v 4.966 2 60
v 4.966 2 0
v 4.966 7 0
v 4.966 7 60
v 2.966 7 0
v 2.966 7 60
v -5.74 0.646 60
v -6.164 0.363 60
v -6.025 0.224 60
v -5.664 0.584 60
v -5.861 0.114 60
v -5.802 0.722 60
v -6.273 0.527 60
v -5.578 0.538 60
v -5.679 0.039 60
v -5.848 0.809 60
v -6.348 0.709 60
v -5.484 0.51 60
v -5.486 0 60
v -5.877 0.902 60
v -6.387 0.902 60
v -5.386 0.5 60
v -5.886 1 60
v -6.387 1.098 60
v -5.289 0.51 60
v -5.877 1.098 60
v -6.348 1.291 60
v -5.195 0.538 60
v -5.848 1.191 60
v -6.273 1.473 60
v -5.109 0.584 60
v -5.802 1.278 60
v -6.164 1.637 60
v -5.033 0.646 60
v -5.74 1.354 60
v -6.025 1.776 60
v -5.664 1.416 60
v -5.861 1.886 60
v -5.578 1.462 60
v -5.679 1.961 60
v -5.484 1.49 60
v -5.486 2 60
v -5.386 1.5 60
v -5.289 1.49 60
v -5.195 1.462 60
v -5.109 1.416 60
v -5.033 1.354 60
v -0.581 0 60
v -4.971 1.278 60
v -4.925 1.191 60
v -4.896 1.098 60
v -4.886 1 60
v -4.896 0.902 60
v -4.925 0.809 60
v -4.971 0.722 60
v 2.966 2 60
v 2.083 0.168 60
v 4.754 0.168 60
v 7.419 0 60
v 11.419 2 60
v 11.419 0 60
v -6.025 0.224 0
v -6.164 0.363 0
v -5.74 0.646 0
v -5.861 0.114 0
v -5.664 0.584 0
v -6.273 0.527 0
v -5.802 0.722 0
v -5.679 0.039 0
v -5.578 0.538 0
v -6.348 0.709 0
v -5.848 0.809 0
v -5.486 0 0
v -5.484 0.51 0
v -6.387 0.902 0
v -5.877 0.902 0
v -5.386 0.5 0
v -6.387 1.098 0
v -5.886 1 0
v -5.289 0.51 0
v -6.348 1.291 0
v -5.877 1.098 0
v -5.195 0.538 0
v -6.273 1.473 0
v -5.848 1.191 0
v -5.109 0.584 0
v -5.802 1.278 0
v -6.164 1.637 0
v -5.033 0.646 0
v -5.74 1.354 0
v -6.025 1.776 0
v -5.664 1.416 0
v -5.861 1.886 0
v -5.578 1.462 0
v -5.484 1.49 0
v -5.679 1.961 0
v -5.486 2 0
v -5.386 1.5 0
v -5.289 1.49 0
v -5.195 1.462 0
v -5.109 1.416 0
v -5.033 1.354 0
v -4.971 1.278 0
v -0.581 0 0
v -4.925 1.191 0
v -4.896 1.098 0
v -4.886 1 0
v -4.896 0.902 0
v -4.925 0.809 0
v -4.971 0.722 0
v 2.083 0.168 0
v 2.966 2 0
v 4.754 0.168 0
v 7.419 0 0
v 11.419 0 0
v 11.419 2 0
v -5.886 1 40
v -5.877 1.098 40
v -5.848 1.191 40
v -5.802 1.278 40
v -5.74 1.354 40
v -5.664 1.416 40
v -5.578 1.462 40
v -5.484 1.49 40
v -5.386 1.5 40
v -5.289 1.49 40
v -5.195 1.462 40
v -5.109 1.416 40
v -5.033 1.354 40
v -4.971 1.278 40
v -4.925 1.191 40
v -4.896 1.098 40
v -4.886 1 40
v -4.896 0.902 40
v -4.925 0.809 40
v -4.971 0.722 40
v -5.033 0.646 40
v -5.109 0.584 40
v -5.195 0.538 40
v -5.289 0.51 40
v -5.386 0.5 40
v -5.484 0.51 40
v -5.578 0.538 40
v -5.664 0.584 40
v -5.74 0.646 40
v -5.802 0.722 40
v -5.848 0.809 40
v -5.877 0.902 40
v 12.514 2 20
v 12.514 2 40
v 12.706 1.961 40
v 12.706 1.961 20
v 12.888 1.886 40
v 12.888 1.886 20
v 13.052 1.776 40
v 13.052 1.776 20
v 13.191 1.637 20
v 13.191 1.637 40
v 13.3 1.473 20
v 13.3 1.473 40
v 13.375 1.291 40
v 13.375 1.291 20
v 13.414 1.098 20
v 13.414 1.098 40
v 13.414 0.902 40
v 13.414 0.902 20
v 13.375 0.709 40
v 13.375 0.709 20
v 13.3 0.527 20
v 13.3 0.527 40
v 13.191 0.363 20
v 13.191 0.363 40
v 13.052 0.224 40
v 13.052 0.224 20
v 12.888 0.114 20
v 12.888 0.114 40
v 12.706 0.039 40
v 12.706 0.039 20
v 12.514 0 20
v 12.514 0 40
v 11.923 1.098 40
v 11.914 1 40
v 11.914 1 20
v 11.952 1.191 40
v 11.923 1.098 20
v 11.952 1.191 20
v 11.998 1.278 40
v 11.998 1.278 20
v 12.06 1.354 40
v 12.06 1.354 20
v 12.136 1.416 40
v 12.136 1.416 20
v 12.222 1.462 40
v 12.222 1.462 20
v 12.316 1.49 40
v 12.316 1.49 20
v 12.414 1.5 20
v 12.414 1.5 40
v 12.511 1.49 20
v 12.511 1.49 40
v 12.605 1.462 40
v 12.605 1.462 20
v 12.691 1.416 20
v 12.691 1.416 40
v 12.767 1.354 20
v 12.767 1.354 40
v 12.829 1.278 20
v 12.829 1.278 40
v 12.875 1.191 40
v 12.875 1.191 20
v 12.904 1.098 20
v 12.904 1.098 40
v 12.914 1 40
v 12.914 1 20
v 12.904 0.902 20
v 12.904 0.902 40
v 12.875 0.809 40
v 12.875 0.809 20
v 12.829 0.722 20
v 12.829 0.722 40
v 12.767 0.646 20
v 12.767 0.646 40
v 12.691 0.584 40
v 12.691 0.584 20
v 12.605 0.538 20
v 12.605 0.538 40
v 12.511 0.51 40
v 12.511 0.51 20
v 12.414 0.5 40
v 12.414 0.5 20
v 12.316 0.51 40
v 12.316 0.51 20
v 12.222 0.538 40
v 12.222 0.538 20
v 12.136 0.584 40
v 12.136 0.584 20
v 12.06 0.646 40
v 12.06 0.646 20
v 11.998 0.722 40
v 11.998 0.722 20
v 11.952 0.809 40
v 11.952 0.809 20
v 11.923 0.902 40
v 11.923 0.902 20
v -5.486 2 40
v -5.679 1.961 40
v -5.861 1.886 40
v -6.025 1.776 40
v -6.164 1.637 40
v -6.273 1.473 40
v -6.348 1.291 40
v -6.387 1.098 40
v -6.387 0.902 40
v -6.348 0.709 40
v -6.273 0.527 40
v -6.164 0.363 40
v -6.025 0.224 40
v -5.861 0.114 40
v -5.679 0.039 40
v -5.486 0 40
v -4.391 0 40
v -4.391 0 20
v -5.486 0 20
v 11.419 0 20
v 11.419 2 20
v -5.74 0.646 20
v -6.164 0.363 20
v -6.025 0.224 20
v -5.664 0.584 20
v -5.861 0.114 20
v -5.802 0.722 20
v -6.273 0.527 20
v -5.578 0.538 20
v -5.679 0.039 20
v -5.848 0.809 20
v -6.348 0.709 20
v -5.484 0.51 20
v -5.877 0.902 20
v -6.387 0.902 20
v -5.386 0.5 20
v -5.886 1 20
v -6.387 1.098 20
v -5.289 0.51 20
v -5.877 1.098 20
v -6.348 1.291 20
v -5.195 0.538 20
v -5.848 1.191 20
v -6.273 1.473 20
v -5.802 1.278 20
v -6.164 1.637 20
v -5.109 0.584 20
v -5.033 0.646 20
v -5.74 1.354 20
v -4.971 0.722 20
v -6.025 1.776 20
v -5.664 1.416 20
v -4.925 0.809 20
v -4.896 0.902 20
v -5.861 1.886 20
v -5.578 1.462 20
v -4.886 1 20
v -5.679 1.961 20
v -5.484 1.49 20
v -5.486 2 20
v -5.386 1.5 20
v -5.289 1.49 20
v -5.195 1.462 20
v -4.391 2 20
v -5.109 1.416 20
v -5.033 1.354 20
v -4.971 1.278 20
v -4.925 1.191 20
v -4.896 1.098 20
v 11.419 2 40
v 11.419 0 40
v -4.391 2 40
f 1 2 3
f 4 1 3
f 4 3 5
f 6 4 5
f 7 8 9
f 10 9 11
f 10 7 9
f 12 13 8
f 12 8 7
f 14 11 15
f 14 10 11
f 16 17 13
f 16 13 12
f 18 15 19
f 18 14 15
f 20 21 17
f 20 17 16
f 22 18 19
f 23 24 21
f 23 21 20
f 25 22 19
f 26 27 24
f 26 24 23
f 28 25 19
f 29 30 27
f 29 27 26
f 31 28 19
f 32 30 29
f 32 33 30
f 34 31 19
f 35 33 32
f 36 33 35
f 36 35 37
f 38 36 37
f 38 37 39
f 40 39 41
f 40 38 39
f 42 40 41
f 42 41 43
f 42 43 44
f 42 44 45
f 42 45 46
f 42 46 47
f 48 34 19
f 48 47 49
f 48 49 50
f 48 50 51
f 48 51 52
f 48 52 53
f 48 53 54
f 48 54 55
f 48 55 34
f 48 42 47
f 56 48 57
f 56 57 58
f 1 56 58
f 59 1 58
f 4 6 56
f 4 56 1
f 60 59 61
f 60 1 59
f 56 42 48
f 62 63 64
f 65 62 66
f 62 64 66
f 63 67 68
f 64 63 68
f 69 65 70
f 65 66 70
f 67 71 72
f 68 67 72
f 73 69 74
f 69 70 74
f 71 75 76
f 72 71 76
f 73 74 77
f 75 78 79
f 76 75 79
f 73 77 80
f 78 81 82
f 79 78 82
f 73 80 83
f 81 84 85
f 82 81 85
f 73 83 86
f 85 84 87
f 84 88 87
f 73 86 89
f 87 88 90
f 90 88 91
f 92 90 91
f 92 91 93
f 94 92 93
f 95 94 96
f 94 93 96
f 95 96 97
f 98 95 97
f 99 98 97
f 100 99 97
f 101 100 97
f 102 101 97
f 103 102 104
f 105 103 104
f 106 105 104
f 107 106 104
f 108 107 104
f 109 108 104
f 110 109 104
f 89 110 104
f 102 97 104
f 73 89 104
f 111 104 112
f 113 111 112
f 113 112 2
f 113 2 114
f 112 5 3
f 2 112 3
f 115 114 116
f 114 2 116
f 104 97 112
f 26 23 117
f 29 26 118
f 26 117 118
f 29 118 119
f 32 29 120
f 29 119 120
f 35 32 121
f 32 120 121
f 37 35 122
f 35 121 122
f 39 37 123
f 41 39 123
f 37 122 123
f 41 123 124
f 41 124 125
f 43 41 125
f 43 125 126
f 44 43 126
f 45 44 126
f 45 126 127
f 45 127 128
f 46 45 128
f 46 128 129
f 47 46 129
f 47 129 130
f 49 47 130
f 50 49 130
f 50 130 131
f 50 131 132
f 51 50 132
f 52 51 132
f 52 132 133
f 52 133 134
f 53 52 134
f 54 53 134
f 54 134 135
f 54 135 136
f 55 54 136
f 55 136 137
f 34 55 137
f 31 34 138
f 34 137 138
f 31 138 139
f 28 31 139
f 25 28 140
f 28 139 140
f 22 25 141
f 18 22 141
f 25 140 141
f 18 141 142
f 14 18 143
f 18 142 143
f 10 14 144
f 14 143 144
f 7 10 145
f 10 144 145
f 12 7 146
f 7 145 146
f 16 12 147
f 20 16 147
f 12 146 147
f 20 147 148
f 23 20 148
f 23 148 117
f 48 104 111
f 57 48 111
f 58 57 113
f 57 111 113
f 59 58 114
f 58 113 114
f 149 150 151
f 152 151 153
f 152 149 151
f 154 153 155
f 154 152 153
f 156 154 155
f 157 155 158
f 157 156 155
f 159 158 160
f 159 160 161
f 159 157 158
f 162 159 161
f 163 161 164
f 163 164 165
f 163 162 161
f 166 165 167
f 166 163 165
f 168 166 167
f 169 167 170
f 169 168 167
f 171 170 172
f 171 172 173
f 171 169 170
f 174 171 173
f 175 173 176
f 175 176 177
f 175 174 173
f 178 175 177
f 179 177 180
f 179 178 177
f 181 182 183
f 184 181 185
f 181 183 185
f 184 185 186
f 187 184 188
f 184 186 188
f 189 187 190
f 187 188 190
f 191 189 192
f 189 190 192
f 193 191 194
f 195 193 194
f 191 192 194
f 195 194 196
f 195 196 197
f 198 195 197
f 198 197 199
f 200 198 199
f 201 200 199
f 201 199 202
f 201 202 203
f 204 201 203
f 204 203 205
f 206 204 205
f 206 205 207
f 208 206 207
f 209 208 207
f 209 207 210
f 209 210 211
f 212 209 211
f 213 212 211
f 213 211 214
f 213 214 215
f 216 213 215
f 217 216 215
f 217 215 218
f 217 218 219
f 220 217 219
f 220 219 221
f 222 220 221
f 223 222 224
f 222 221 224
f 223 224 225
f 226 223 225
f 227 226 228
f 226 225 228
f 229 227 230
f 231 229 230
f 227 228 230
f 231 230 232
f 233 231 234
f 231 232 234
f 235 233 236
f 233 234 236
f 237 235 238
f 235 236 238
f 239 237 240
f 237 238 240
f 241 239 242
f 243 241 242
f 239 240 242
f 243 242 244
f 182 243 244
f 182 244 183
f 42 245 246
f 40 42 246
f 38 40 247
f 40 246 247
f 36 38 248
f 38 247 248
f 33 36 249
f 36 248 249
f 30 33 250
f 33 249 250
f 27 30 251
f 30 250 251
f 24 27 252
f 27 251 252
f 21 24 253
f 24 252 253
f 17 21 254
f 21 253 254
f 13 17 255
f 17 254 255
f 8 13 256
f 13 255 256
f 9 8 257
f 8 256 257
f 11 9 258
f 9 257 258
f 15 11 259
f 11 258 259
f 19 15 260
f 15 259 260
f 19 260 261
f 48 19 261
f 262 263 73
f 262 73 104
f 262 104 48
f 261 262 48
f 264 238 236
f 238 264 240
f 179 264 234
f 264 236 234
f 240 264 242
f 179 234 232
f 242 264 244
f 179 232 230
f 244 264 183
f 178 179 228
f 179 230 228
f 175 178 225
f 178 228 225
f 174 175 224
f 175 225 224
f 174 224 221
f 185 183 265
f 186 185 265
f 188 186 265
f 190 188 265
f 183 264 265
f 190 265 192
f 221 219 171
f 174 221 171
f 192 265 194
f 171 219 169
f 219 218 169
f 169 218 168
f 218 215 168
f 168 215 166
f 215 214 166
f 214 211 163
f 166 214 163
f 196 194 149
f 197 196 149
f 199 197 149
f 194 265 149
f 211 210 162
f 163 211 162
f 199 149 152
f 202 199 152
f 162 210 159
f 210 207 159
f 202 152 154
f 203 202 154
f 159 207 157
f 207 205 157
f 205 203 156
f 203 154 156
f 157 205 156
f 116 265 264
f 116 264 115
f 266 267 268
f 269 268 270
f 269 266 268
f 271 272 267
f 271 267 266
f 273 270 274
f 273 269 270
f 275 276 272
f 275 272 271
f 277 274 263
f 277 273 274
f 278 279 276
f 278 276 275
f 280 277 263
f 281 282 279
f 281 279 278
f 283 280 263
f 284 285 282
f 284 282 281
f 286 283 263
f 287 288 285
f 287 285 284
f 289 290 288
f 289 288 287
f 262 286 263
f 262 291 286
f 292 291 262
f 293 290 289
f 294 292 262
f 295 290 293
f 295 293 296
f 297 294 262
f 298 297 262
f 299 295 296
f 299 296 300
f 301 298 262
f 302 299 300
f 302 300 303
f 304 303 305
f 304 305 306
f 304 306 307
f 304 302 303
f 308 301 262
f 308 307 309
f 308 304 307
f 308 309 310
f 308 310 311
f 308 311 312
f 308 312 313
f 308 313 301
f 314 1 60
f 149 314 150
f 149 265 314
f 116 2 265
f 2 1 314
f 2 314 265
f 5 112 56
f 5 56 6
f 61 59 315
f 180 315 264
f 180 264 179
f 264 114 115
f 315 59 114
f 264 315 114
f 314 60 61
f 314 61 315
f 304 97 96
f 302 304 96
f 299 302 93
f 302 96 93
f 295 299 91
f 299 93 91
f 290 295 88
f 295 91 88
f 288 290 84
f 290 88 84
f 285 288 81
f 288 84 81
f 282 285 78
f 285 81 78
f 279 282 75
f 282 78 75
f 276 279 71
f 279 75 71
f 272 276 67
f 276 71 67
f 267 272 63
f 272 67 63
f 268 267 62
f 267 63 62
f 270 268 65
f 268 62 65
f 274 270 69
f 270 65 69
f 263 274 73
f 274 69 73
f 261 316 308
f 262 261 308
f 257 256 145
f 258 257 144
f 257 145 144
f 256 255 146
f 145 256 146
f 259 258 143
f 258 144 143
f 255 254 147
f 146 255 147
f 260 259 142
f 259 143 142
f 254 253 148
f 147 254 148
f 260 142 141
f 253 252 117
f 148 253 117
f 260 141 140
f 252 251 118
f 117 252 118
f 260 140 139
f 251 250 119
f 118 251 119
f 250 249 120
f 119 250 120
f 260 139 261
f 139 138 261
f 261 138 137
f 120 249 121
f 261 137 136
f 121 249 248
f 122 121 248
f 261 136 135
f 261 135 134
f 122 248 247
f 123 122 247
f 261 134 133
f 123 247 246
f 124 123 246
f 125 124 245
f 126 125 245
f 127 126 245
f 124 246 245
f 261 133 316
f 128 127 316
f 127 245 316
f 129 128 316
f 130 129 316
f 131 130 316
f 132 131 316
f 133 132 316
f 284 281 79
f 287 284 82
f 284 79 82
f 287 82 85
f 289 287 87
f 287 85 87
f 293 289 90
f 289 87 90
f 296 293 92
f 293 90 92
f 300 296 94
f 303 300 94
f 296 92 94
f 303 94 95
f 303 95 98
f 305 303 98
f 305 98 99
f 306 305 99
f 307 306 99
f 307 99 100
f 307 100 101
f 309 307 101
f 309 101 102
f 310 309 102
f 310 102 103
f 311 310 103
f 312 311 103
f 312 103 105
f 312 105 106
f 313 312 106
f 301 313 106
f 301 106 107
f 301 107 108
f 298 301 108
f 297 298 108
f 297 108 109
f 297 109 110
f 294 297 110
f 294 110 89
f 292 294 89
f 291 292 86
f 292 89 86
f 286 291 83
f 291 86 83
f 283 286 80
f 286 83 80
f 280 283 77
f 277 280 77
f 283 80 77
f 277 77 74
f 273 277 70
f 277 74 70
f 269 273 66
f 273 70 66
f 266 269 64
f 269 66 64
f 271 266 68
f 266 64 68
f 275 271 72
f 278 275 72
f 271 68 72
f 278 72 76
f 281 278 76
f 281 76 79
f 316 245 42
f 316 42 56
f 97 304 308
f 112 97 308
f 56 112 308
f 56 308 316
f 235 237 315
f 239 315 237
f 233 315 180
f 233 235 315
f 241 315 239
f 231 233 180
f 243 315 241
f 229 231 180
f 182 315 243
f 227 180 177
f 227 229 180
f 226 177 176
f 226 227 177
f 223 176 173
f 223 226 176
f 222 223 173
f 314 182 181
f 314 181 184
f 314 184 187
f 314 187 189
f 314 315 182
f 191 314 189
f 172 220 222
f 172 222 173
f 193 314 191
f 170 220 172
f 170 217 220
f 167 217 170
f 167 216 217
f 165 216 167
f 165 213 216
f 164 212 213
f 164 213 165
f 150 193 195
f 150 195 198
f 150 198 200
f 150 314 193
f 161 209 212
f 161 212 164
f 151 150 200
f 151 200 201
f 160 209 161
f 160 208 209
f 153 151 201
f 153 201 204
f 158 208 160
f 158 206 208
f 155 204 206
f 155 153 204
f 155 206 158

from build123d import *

# Parameters (mm, degrees)
SKETCH1_W           = 20
SKETCH1_H           = 2
BOSS_EXTRUDE1_DEPTH = 60
CUT_EXTRUDE2_DEPTH  = 70
SKETCH5_R           = 0.5
CUT_EXTRUDE3_DEPTH  = 70
SKETCH6_W           = 2
SKETCH6_H           = 20
CUT_EXTRUDE4_DEPTH  = 70
SKETCH7_W           = 2
SKETCH7_H           = 5
BOSS_EXTRUDE2_DEPTH = 60
SKETCH9_W           = 8
SKETCH9_H           = 60
CUT_EXTRUDE5_DEPTH  = 1
BOSS_EXTRUDE3_DEPTH = 60


with BuildPart() as part:
    # Sketch1 → Boss-Extrude1 (new body)
    with BuildSketch(Plane.XY):
        with Locations((3.513513514, 1)):
            Rectangle(SKETCH1_W, SKETCH1_H)
    extrude(amount=BOSS_EXTRUDE1_DEPTH)

    # Sketch4 → Cut-Extrude2 (cut)
    with BuildSketch(Plane(origin=(0, 0, 0), x_dir=(-1, 0, 0), z_dir=(0, 0, -1))):
        with BuildLine():
            Line((-13.513513514, 2), (-12.513513514, 2))
            ThreePointArc((-12.513513514, 2), (-13.417253411, 0.949937849), (-12.413513514, -0.004987562))
            Line((-12.413513514, -0.004987562), (-13.513513514, -0.004987562))
            Line((-13.513513514, -0.004987562), (-13.513513514, 2))
        make_face()
        with BuildLine():
            Line((6.486486486, 2), (5.486486486, 2))
            ThreePointArc((5.486486486, 2), (6.390226384, 0.949937849), (5.386486486, -0.004987562))
            Line((5.386486486, -0.004987562), (6.486486486, -0.004987562))
            Line((6.486486486, -0.004987562), (6.486486486, 2))
        make_face()
    extrude(amount=-CUT_EXTRUDE2_DEPTH, mode=Mode.SUBTRACT)

    # Sketch5 → Cut-Extrude3 (cut)
    with BuildSketch(Plane(origin=(0, 0, 0), x_dir=(-1, 0, 0), z_dir=(0, 0, -1))):
        with Locations((-12.413513514, 1)):
            Circle(SKETCH5_R)
        with Locations((5.386486486, 1)):
            Circle(SKETCH5_R)
    extrude(amount=-CUT_EXTRUDE3_DEPTH, mode=Mode.SUBTRACT)

    # Sketch6 → Cut-Extrude4 (cut)
    with BuildSketch(Plane(origin=(0, 2, 0), x_dir=(1, 0, 0), z_dir=(0, 1, 0))):
        with Locations((-5.391474049, -30)):
            Rectangle(SKETCH6_W, SKETCH6_H)
        with Locations((12.418501076, -10)):
            Rectangle(SKETCH6_W, SKETCH6_H)
        with Locations((12.418501076, -50)):
            Rectangle(SKETCH6_W, SKETCH6_H)
    extrude(amount=-CUT_EXTRUDE4_DEPTH, mode=Mode.SUBTRACT)

    # Sketch7 → Boss-Extrude2 (add)
    with BuildSketch(Plane(origin=(0, 0, 0), x_dir=(-1, 0, 0), z_dir=(0, 0, -1))):
        with Locations((-3.966007295, 4.5)):
            Rectangle(SKETCH7_W, SKETCH7_H)
    extrude(amount=-BOSS_EXTRUDE2_DEPTH)

    # Sketch9 → Cut-Extrude5 (cut)
    with BuildSketch(Plane(origin=(0, 0, 0), x_dir=(-1, 0, 0), z_dir=(0, -1, 0))):
        with Locations((-3.418501076, -30)):
            Rectangle(SKETCH9_W, SKETCH9_H)
    extrude(amount=-CUT_EXTRUDE5_DEPTH, mode=Mode.SUBTRACT)

    # Sketch12 → Boss-Extrude3 (add)
    with BuildSketch(Plane(origin=(0, 0, 0), x_dir=(-1, 0, 0), z_dir=(0, 0, -1))):
        with BuildLine():
            Line((-7.418501076, 1), (0.581498924, 1))
            Line((0.581498924, 1), (0.581498924, 0))
            ThreePointArc((0.581498924, 0), (-3.418501076, 0.188654004), (-7.418501076, 0))
            Line((-7.418501076, 0), (-7.418501076, 1))
        make_face()
    extrude(amount=-BOSS_EXTRUDE3_DEPTH)


solid = part.part
